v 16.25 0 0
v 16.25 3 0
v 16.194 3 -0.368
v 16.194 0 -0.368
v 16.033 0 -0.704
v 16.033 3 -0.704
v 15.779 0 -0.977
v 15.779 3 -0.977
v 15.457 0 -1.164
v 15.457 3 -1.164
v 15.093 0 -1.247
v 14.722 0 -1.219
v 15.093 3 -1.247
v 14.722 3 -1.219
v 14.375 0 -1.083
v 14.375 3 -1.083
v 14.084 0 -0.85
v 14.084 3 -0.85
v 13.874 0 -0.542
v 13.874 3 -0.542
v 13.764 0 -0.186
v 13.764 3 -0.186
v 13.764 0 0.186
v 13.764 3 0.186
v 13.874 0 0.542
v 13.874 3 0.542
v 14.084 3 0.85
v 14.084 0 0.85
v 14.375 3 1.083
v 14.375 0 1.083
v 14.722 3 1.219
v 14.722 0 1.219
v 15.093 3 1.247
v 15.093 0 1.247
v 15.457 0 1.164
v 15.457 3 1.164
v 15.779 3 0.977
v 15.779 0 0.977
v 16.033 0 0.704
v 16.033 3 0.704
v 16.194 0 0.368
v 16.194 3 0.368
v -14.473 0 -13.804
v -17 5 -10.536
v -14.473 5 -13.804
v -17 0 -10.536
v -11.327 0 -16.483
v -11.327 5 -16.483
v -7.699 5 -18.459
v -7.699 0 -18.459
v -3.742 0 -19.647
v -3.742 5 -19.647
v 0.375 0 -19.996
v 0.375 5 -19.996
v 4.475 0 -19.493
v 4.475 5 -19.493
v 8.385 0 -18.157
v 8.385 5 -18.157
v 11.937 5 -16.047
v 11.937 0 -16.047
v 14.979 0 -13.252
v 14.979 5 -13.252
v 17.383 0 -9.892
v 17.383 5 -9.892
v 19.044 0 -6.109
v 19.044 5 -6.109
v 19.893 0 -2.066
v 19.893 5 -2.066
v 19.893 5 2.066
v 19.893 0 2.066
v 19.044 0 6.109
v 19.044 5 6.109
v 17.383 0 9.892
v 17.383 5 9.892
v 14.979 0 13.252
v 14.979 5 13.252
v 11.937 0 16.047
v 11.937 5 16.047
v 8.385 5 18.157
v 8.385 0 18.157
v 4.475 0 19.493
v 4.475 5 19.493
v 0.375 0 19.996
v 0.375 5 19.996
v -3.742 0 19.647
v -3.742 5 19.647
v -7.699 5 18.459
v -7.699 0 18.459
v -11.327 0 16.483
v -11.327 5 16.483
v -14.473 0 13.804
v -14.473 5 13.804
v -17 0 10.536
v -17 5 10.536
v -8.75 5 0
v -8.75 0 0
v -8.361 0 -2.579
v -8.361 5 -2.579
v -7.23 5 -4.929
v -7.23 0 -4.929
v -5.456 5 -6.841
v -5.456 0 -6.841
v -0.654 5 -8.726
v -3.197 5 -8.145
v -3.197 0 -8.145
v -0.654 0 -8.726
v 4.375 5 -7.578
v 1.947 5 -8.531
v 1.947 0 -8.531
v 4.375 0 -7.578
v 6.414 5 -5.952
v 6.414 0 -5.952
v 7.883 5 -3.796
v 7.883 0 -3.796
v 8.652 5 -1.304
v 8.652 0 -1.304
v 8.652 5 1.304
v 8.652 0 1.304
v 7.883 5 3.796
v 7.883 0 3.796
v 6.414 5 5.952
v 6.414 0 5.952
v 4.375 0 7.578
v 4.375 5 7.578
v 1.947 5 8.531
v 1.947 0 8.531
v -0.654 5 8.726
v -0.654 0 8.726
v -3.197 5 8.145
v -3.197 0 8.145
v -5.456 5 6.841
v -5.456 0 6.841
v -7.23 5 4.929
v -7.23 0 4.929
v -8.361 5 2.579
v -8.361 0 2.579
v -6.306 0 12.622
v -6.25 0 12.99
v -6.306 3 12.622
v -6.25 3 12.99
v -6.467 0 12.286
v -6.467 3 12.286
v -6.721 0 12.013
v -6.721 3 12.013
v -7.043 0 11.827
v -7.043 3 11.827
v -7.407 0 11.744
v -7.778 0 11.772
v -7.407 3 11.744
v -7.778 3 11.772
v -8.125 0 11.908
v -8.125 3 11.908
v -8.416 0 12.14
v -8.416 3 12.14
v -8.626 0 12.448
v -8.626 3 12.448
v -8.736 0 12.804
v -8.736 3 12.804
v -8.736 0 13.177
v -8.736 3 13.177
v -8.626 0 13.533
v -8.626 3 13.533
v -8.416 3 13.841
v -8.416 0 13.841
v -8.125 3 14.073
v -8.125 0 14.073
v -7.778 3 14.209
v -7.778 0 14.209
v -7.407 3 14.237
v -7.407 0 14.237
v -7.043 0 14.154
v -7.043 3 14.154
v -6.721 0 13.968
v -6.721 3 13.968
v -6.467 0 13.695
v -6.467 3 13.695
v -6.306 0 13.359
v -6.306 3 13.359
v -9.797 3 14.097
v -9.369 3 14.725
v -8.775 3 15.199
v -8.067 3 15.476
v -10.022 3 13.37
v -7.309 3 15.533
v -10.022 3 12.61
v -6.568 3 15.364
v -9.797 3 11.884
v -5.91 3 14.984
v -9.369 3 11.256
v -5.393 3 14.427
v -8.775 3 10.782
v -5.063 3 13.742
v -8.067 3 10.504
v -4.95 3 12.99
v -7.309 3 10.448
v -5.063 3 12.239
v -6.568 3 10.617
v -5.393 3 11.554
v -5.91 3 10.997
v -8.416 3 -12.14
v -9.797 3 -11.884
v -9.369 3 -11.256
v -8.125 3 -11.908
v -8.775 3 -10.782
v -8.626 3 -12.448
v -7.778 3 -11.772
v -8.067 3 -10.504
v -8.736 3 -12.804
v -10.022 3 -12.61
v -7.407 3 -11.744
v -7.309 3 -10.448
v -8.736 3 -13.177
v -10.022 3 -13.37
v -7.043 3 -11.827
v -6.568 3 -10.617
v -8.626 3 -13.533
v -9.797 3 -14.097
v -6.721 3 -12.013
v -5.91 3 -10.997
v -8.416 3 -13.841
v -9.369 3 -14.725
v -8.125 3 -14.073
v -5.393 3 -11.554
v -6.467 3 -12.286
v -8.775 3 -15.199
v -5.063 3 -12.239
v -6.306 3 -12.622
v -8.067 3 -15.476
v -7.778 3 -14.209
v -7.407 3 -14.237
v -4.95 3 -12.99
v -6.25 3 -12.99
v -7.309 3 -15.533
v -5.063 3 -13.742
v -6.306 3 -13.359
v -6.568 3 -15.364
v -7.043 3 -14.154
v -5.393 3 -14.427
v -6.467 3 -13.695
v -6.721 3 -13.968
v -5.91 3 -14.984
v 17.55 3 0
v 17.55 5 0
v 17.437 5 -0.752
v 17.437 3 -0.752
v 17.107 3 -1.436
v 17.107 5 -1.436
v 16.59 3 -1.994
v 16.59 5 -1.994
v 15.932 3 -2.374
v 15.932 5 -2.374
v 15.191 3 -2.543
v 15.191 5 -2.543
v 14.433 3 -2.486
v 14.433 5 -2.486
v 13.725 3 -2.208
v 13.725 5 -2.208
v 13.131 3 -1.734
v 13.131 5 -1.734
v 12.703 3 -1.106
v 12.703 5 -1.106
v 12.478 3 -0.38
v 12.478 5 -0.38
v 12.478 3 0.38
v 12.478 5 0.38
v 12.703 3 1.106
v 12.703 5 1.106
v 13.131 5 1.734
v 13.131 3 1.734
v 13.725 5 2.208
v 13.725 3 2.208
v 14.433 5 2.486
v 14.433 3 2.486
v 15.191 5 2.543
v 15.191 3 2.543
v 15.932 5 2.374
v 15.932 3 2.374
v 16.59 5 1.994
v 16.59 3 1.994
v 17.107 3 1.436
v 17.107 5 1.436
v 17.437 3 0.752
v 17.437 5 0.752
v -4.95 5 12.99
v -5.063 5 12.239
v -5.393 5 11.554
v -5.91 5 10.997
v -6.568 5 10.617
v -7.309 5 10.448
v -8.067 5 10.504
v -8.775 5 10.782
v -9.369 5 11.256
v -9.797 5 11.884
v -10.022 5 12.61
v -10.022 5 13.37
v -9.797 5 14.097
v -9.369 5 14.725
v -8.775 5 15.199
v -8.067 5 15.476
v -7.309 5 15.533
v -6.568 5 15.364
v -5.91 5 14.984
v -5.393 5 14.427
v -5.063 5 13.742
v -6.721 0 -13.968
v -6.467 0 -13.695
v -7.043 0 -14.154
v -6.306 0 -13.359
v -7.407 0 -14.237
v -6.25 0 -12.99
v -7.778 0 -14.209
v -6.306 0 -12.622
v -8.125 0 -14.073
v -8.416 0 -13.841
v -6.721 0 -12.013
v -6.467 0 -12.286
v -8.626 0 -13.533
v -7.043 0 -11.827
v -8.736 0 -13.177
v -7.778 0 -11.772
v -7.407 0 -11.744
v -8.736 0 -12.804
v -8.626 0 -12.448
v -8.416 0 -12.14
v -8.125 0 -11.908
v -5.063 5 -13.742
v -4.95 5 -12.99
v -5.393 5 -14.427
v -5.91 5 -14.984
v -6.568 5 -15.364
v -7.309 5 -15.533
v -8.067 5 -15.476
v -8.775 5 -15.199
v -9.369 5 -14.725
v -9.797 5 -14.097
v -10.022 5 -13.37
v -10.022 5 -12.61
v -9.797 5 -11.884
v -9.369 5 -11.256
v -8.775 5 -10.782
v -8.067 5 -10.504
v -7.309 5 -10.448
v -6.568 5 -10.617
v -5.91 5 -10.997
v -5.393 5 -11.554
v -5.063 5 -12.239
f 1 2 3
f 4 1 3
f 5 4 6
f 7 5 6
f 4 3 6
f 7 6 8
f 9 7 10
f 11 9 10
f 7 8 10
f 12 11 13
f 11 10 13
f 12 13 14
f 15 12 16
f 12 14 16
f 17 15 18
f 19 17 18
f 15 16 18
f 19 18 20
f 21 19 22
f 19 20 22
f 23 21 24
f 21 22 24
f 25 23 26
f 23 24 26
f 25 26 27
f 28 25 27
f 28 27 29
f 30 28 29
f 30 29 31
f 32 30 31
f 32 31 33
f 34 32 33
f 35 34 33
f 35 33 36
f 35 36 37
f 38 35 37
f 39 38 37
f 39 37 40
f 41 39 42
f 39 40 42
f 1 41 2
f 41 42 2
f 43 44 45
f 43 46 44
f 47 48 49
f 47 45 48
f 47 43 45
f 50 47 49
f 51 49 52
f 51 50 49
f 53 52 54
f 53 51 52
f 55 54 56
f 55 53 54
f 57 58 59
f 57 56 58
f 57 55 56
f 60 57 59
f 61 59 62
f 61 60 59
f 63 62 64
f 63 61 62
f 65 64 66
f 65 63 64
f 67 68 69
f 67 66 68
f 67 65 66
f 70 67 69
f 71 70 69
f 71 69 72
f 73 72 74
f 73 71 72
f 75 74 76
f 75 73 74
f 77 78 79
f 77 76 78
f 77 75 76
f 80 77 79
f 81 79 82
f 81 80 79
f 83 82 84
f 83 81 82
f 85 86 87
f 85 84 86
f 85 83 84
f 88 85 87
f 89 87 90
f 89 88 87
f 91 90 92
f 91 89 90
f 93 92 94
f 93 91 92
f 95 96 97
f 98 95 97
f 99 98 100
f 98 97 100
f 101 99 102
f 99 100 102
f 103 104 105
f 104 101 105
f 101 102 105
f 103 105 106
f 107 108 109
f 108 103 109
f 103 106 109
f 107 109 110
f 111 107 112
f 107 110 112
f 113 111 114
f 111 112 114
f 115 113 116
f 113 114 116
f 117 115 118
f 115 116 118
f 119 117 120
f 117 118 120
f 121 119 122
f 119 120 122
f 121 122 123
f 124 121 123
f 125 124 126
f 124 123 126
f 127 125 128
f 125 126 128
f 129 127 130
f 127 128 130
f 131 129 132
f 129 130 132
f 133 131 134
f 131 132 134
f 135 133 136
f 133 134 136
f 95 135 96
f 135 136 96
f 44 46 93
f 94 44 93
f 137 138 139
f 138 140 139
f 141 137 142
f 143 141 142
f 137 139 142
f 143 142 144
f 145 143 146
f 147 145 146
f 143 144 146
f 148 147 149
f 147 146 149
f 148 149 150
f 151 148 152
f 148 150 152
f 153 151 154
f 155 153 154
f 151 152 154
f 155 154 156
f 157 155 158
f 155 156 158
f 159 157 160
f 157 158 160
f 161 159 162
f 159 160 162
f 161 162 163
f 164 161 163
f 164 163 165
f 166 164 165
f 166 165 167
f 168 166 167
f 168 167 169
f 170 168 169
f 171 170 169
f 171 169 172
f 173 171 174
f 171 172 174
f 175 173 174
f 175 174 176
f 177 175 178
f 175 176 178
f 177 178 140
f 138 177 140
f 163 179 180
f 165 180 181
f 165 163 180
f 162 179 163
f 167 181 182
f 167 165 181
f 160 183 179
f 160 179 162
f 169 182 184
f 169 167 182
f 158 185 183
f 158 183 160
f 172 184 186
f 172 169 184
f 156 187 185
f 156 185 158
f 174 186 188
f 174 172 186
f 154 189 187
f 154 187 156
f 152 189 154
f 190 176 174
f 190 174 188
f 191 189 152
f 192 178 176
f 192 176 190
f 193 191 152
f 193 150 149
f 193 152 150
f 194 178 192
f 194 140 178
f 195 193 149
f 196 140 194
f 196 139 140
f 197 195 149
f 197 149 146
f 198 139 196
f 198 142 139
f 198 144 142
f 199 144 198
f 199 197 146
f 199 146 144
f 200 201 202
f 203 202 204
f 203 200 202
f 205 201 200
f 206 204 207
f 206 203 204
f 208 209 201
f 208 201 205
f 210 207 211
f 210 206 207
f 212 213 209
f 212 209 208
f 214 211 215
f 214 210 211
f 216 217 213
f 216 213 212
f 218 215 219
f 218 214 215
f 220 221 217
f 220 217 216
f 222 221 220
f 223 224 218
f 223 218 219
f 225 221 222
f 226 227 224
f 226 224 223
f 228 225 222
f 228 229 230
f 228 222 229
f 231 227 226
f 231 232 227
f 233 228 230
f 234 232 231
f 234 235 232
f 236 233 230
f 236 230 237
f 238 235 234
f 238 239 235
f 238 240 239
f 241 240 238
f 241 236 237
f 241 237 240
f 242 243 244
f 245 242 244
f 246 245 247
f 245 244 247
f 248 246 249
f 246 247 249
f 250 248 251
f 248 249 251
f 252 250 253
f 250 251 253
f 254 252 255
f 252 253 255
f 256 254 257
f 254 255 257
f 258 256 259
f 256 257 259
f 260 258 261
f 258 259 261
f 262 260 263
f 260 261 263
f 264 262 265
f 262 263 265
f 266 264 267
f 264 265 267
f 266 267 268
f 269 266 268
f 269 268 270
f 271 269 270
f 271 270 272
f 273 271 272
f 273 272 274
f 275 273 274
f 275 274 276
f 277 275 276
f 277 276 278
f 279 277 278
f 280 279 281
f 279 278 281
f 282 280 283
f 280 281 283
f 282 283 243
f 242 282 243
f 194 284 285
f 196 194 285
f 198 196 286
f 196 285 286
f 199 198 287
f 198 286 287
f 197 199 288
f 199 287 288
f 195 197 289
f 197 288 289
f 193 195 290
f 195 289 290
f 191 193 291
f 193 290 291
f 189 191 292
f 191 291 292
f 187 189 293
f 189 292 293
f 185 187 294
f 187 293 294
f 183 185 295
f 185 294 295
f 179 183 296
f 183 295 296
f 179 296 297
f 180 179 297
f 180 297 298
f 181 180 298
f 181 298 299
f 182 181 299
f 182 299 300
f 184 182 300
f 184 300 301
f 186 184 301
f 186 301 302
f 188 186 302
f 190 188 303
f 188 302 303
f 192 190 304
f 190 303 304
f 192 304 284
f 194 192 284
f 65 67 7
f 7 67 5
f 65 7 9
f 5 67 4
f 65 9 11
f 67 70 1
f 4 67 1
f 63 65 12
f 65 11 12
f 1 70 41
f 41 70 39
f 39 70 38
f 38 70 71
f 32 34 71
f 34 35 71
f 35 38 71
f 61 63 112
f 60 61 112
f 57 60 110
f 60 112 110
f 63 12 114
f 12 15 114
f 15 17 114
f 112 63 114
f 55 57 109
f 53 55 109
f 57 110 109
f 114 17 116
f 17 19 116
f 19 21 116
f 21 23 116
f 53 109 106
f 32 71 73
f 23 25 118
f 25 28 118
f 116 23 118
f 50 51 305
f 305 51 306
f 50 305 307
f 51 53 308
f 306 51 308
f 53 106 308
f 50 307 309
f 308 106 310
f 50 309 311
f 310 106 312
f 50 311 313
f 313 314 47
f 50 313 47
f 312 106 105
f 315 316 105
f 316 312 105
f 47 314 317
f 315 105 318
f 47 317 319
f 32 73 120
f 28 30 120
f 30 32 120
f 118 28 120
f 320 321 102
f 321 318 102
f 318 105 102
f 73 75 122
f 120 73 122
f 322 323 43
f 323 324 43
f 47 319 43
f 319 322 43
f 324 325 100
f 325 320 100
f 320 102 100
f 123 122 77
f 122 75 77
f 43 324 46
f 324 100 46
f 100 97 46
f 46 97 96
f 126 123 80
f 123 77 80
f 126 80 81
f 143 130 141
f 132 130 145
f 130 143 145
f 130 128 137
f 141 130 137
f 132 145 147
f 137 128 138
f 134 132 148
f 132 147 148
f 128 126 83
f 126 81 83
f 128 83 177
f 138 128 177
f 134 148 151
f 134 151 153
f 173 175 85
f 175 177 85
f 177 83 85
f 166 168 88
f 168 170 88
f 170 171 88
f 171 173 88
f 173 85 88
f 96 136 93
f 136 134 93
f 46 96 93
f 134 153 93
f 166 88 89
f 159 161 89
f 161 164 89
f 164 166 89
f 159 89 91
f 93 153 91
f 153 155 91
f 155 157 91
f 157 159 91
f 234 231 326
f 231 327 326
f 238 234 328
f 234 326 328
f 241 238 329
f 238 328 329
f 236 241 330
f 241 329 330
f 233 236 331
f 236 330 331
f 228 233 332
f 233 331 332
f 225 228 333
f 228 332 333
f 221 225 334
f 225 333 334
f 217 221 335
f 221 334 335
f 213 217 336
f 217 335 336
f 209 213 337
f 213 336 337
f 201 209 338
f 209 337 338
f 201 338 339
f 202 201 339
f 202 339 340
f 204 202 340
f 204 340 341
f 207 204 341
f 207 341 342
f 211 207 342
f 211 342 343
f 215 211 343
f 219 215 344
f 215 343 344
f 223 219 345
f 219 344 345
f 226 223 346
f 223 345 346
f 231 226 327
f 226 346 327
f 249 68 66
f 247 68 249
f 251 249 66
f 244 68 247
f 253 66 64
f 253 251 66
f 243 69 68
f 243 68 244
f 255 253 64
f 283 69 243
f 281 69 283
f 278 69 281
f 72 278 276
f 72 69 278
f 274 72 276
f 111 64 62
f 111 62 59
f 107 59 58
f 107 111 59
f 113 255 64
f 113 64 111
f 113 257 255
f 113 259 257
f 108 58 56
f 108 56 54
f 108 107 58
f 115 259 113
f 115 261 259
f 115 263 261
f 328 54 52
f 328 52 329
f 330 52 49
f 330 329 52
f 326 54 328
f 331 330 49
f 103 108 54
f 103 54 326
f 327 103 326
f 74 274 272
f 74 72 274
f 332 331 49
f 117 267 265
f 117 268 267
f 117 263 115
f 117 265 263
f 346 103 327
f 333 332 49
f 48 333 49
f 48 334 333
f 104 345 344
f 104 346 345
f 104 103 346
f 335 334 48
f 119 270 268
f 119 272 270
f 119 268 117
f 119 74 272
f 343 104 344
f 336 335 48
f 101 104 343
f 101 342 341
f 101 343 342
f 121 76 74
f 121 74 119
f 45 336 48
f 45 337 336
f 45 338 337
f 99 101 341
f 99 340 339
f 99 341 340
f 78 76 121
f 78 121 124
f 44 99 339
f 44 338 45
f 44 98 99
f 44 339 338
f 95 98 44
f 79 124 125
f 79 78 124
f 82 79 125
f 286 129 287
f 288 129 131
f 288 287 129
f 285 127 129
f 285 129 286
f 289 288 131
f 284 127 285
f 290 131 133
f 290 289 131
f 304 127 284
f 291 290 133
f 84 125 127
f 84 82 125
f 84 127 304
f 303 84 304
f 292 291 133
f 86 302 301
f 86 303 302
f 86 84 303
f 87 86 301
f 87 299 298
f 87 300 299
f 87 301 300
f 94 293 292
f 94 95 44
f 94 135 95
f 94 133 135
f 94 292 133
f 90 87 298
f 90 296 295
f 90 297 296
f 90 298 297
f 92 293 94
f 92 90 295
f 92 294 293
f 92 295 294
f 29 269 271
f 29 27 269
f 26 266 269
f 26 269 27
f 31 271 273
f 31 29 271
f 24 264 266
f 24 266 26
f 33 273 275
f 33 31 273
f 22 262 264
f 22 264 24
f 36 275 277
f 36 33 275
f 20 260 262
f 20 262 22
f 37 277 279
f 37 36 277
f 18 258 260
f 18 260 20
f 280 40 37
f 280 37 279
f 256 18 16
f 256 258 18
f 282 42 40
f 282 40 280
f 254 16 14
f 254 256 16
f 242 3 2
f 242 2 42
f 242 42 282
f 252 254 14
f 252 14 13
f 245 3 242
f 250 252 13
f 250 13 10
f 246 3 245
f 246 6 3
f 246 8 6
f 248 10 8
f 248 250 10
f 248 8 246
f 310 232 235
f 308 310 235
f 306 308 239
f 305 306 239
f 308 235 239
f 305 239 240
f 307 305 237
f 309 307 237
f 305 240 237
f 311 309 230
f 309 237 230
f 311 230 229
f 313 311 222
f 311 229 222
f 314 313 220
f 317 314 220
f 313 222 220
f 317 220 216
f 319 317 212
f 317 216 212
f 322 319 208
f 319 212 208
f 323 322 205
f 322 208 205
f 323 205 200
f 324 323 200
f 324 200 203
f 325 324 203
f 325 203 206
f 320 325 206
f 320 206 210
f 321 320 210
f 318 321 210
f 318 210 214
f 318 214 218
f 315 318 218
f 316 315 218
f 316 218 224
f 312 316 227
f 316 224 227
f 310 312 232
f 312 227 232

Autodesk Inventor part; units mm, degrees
ref_plane "YZ Plane" through (0, 0, 0) normal (1, 0, 0) x (0, 1, 0)
ref_plane "XZ Plane" through (0, 0, 0) normal (0, 1, 0) x (-1, 0, 0)
ref_plane "XY Plane" through (0, 0, 0) normal (0, 0, 1) x (1, 0, 0)
sketch "Sketch1" plane through (0, 0, 0) normal (0, 1, 0) x (-1, 0, 0)
  circle A0 centre (0, 0) radius 8.75
  circle A1 centre (0, 0) radius 20
  dimension "d0" = 17.5
  dimension "d1" = 40
extrude "Extrusion1" add sketch "Sketch1" along normal blind 5
sketch "Sketch2" plane through (0, 5, 0) normal (0, 1, 0) x (1, 0, 0)
  circle A0 centre (0, 0) radius 15 construction
  circle A1 centre (15, 0) radius 2.55
  circle A2 centre (0, 0) radius 15 construction
  circle A3 centre (-7.5, 12.9904) radius 2.55
  circle A4 centre (0, 0) radius 15 construction
  circle A5 centre (-7.5, -12.9904) radius 2.55
  dimension "d4" = 30
  dimension "d5" = 5.1
  dimension "d8" = 360
extrude "Extrusion3" cut sketch "Sketch2" against normal blind 2
sketch "Sketch3" plane through (-7.5, 3, 12.9904) normal (0, 1, 0) x (1, 0, 0)
  circle A0 centre (0, 0) radius 1.25
  circle A1 centre (22.5, 12.9904) radius 2.55 projected
  circle A2 centre (22.5, 12.9904) radius 1.25
  circle A3 centre (0, 25.9808) radius 2.55 projected
  circle A4 centre (0, 25.9808) radius 1.25
  point P0 (7.5, 12.9904)
  dimension "d14" = 2.5
  dimension "d15" = 2.5
  dimension "d16" = 2.5
extrude "Extrusion4" cut sketch "Sketch3" against normal blind 3 contours A0 | A2 | A4
sketch "Sketch4" plane through (0, 0, 0) normal (0, -1, 0) x (1, 0, 0)
  line L0 (-17, -45) -> (-17, 22) projected
  arc A0 (-17, 10.5357) -> (-17, -10.5357) centre (0, 0) ccw
extrude "Extrusion5" cut sketch "Sketch4" against normal blind 10
properties part number "modified_o_ring"
